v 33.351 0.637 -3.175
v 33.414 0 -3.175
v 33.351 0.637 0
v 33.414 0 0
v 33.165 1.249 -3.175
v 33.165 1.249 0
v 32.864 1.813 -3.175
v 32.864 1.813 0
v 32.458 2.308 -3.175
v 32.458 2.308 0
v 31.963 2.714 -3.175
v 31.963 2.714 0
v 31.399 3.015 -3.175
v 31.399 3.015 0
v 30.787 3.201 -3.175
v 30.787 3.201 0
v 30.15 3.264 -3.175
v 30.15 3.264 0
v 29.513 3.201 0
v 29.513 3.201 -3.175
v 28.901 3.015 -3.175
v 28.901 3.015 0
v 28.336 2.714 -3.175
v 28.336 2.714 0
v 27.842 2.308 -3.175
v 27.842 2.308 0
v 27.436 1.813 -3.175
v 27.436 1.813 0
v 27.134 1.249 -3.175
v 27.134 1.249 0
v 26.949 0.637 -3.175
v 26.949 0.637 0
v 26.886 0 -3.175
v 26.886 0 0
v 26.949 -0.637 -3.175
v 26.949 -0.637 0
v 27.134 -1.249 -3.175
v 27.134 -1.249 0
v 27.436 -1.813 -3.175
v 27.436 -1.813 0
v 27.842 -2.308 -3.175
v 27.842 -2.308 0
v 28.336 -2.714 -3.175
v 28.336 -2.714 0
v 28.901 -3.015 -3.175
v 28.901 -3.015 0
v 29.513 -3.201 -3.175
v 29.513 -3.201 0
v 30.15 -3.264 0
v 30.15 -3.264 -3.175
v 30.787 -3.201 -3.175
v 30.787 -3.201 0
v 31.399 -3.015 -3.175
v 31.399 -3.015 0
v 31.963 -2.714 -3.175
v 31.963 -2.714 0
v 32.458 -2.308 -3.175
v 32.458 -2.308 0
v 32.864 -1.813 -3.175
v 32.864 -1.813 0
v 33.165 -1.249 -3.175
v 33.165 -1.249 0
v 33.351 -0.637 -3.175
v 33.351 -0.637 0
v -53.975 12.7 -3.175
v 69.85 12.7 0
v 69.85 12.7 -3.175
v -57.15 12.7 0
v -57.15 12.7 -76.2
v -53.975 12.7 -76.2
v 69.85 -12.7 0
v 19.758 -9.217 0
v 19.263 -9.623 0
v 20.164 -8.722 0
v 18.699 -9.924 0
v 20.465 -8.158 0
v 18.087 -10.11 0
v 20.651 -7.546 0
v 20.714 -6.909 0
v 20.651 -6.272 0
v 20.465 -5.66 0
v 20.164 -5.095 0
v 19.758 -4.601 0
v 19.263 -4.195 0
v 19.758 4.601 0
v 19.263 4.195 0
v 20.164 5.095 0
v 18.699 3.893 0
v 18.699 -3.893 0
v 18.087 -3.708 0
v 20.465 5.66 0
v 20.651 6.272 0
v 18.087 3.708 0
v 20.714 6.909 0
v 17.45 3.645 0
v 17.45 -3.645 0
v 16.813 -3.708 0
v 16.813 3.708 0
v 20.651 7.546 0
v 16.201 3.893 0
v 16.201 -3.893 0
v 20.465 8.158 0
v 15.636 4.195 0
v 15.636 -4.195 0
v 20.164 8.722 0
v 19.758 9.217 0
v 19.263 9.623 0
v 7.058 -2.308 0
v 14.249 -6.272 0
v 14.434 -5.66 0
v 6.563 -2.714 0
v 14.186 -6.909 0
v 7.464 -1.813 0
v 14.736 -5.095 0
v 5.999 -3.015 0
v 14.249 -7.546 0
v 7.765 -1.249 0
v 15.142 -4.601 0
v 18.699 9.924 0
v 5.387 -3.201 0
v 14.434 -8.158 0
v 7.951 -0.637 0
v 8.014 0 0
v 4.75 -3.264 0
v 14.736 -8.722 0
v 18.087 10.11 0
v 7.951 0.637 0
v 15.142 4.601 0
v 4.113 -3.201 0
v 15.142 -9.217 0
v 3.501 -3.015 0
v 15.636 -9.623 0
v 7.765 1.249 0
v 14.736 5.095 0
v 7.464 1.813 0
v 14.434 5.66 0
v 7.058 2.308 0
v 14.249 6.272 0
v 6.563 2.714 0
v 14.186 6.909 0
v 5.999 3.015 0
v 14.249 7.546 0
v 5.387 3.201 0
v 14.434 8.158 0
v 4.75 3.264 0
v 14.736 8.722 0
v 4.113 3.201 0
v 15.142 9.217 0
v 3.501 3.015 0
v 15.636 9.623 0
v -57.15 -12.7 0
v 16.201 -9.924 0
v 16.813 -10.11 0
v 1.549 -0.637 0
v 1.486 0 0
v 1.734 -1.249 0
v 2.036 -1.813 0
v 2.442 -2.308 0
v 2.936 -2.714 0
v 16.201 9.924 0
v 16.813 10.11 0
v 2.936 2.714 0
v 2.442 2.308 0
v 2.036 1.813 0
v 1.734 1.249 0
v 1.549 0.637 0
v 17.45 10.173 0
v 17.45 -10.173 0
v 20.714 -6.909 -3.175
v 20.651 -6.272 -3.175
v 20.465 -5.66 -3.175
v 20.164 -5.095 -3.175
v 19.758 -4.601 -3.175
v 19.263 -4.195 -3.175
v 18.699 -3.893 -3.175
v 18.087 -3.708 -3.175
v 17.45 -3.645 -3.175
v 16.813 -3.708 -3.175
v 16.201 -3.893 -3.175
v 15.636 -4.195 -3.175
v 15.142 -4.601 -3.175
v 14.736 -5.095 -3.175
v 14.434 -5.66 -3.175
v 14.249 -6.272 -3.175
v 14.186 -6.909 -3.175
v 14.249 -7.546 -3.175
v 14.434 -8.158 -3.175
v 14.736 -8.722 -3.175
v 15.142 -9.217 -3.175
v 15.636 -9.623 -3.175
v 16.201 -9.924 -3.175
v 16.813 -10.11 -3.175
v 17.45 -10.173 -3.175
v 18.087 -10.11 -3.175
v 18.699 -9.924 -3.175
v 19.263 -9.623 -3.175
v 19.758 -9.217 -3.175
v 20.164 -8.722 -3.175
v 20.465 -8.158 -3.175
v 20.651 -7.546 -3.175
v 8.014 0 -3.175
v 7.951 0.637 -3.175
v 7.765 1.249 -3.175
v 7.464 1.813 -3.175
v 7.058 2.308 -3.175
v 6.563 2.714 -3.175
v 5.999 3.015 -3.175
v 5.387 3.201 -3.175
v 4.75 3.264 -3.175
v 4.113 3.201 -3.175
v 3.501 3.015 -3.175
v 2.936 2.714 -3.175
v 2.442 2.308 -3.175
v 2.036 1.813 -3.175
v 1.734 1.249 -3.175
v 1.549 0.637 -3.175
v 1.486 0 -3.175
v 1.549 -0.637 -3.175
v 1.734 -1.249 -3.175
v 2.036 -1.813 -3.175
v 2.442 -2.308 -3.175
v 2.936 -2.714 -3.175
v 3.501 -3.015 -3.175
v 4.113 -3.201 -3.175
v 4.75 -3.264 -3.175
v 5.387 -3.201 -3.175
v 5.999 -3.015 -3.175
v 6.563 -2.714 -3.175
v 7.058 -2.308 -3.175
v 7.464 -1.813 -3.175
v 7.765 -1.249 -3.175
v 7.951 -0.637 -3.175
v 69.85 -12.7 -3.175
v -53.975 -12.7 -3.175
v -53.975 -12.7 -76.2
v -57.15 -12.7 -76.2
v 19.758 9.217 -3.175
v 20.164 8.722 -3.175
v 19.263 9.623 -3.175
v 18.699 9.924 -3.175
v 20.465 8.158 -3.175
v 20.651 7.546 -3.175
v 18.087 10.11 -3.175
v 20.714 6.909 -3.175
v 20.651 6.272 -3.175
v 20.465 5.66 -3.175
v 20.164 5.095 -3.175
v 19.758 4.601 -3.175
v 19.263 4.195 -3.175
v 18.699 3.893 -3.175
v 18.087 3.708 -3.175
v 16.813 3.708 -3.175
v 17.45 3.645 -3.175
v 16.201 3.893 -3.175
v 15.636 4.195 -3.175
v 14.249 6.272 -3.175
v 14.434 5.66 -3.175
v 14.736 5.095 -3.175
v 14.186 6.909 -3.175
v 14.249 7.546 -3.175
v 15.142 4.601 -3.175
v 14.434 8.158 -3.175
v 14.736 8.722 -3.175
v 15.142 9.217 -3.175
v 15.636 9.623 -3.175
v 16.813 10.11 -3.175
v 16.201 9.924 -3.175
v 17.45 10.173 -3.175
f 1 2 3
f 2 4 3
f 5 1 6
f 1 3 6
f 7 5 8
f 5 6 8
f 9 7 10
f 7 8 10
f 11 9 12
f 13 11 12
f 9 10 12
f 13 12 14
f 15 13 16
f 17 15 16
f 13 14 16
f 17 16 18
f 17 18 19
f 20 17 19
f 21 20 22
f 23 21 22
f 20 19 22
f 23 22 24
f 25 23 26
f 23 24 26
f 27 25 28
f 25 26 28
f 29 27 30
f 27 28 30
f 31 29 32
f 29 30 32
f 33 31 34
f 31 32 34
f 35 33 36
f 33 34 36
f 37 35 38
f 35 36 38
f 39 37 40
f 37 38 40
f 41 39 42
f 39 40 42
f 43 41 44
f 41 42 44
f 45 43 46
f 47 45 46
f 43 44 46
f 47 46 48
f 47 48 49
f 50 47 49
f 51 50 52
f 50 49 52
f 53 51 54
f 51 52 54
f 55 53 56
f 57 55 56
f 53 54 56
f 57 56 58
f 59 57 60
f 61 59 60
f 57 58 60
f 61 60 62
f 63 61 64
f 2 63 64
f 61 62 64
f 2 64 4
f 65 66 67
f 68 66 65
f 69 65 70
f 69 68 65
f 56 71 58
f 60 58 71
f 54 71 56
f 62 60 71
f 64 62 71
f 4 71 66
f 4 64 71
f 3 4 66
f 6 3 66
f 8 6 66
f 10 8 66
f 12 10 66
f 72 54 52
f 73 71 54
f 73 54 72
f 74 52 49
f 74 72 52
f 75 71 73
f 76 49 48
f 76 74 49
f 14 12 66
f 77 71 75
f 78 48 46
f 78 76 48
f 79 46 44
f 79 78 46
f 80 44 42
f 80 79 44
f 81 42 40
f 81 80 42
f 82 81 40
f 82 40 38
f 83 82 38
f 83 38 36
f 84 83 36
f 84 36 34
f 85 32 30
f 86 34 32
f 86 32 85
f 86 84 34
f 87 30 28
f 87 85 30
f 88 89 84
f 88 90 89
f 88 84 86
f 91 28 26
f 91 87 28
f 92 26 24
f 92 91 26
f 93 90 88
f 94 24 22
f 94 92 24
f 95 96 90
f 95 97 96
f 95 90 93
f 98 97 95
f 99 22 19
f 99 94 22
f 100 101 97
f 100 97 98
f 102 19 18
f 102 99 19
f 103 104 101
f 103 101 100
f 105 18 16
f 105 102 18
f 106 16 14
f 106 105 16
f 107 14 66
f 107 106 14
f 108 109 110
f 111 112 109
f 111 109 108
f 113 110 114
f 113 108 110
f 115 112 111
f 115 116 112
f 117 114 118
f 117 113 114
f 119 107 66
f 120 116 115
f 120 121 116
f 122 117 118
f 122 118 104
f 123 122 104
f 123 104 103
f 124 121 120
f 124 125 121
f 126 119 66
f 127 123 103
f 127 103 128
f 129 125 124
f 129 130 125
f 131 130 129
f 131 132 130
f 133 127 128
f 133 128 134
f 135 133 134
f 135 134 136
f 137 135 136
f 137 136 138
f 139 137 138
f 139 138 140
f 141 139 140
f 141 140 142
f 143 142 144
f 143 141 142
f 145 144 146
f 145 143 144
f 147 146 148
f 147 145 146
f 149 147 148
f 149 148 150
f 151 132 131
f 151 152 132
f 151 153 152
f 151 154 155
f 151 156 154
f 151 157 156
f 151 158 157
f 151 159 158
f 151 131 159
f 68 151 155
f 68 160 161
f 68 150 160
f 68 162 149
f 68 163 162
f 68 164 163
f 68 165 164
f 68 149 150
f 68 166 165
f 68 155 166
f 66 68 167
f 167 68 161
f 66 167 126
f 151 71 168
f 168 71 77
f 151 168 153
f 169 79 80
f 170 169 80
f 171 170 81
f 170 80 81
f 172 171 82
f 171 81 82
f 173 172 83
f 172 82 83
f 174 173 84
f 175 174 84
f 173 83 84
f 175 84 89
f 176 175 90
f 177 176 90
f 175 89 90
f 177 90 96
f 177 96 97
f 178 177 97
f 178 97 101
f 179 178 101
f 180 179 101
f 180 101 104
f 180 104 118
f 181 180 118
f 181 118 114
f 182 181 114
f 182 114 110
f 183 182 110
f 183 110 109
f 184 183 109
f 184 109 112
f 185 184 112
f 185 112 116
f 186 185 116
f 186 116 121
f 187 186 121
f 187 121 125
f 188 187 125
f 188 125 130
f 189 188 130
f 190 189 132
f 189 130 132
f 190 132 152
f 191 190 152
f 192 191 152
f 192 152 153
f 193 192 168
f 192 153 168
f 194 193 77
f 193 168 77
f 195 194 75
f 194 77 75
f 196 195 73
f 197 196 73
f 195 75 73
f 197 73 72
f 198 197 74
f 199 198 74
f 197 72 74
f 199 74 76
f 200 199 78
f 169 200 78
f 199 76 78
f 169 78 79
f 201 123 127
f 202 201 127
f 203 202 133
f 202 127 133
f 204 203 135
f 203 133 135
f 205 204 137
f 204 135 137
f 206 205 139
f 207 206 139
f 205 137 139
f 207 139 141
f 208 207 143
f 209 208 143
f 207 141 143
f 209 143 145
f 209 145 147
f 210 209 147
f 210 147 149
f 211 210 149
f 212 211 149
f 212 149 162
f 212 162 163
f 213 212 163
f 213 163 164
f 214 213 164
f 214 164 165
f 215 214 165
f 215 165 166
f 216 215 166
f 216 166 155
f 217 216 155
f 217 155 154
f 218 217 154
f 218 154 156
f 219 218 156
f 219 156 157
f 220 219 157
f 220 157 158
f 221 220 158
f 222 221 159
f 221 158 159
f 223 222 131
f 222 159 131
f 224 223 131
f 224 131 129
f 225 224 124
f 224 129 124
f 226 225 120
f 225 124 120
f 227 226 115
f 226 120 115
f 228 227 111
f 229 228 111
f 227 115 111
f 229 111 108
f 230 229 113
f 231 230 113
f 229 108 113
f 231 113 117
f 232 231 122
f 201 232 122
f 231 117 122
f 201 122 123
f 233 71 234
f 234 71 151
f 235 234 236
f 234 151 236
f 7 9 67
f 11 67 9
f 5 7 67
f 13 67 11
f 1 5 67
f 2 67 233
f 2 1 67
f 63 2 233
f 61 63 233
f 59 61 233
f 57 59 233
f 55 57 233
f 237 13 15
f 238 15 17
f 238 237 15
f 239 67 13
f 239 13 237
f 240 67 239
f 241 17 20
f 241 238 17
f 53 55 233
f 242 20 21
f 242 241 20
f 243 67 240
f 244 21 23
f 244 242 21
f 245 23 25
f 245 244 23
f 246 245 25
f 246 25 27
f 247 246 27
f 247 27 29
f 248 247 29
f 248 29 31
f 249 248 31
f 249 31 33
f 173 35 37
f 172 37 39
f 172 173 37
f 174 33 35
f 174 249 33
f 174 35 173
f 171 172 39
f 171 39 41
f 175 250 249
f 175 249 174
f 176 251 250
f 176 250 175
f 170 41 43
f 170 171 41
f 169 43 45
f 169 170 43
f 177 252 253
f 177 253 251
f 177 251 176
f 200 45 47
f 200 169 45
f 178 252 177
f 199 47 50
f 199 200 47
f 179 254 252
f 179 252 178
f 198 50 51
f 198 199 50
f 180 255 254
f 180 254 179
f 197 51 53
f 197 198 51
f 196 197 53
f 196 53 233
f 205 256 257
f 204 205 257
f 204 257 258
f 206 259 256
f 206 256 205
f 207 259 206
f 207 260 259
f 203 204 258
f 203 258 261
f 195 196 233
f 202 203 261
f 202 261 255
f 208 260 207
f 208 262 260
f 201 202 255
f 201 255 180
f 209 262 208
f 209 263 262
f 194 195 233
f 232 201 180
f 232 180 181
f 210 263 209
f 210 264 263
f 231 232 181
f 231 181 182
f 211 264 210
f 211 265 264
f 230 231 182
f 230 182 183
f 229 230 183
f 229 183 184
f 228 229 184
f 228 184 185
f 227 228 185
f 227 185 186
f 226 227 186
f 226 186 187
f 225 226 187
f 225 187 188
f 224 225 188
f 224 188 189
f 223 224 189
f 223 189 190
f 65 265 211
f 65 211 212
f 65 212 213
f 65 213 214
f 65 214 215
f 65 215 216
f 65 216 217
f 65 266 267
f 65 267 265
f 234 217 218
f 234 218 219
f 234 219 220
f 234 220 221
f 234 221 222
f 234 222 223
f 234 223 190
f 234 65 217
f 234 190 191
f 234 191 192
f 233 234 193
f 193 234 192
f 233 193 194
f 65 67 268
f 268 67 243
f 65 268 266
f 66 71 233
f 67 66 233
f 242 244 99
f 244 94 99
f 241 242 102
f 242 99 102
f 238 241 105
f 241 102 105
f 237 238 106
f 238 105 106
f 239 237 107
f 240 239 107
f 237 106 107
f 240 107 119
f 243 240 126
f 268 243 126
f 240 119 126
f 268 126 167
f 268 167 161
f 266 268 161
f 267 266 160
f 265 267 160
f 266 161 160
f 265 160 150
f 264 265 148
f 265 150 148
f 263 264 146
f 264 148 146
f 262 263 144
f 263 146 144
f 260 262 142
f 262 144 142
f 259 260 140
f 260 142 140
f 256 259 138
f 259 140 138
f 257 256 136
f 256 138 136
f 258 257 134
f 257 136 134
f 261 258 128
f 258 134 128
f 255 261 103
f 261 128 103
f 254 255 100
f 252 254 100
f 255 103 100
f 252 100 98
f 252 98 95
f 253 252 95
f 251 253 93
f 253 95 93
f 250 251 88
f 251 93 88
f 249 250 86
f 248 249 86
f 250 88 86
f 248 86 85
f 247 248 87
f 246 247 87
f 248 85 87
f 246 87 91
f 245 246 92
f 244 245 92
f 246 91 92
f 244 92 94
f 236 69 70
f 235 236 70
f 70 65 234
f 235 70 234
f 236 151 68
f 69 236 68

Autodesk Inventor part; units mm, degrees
ref_plane "YZ Plane" through (0, 0, 0) normal (1, 0, 0) x (0, 1, 0)
ref_plane "XZ Plane" through (0, 0, 0) normal (0, 1, 0) x (-1, 0, 0)
ref_plane "XY Plane" through (0, 0, 0) normal (0, 0, 1) x (1, 0, 0)
sketch "Sketch1" plane through (0, 0, 0) normal (0, 0, 1) x (1, 0, 0)
  line L0 (57.15, 12.7) -> (-57.15, 12.7)
  line L1 (-57.15, 12.7) -> (-57.15, -12.7)
  line L2 (-57.15, -12.7) -> (57.15, -12.7)
  line L3 (57.15, -12.7) -> (57.15, 12.7)
  point P0 (0, 0)
  dimension "d0" = 114.3
  dimension "d1" = 25.4
extrude "Extrusion1" add sketch "Sketch1" against normal blind 3.175
sketch "Sketch2" plane through (-57.15, -12.7, 0) normal (-1, 0, 0) x (0, 0, 1)
  line L0 (0, 25.4) -> (0, 0) projected
  line L1 (0, 25.4) -> (-3.175, 25.4) projected
  line L2 (-3.175, 0) -> (-3.175, 25.4) projected
  line L3 (0, 0) -> (-3.175, 0) projected
  point P0 (0, 12.7)
sketch "Sketch3" plane through (0, 0, 0) normal (0, 0, 1) x (1, 0, 0)
  line L0 (57.15, -12.7) -> (-57.15, -12.7) projected
  line L1 (-57.15, 12.7) -> (-53.975, 12.7)
  line L2 (-53.975, 12.7) -> (-53.975, -12.7)
  line L3 (-53.975, -12.7) -> (-57.15, -12.7)
  line L4 (-57.15, -12.7) -> (-57.15, 12.7)
  point P0 (0, 0)
  dimension "d4" = 3.175
extrude "Extrusion2" cut sketch "Sketch2" against normal blind 3.175
extrude "Extrusion3" add sketch "Sketch3" against normal blind 76.2
sketch "Sketch4" plane through (0, 0, 0) normal (0, 0, 1) x (1, 0, 0)
  point P0 (0, 0)
sketch "Sketch5" plane through (0, 0, 0) normal (0, 0, 1) x (1, 0, 0)
  point P0 (0, 0)
sketch "Sketch6" plane through (57.15, -12.7, 0) normal (1, 0, 0) x (0, 0, -1)
  line L0 (0, 0) -> (0, 25.4) projected
  line L1 (0, 0) -> (3.175, 0) projected
  line L2 (3.175, 25.4) -> (3.175, 0) projected
  line L3 (0, 25.4) -> (3.175, 25.4) projected
  point P0 (0, 12.7)
extrude "Extrusion4" add sketch "Sketch6" along normal blind 12.7
sketch "Sketch7" plane through (0, 0, 0) normal (0, 0, 1) x (1, 0, 0)
  point P0 (0, 0)
sketch "Sketch8" plane through (0, 0, 0) normal (0, 0, 1) x (1, 0, 0)
  circle A0 centre (4.7498, 0) radius 3.2639
  point P0 (0, 0)
  dimension "d11" = 6.5278
extrude "Extrusion5" cut sketch "Sketch8" against normal blind 3.175
sketch "Sketch9" plane through (0, 0, 0) normal (0, 0, 1) x (1, 0, 0)
  circle A0 centre (30.1498, 0) radius 3.2639
  point P0 (0, 0)
  dimension "d14" = 6.5278
extrude "Extrusion6" cut sketch "Sketch9" against normal blind 3.175
sketch "Sketch10" plane through (0, 0, 0) normal (0, 0, 1) x (1, 0, 0)
  circle A0 centre (17.4498, 6.9088) radius 3.2639
  circle A1 centre (17.4498, -6.9088) radius 3.2639
  point P0 (0, 0)
  dimension "d17" = 6.5278
  dimension "d18" = 6.5278
extrude "Extrusion7" cut sketch "Sketch10" against normal blind 3.175
properties part number "lBracketForLiftingBar"
